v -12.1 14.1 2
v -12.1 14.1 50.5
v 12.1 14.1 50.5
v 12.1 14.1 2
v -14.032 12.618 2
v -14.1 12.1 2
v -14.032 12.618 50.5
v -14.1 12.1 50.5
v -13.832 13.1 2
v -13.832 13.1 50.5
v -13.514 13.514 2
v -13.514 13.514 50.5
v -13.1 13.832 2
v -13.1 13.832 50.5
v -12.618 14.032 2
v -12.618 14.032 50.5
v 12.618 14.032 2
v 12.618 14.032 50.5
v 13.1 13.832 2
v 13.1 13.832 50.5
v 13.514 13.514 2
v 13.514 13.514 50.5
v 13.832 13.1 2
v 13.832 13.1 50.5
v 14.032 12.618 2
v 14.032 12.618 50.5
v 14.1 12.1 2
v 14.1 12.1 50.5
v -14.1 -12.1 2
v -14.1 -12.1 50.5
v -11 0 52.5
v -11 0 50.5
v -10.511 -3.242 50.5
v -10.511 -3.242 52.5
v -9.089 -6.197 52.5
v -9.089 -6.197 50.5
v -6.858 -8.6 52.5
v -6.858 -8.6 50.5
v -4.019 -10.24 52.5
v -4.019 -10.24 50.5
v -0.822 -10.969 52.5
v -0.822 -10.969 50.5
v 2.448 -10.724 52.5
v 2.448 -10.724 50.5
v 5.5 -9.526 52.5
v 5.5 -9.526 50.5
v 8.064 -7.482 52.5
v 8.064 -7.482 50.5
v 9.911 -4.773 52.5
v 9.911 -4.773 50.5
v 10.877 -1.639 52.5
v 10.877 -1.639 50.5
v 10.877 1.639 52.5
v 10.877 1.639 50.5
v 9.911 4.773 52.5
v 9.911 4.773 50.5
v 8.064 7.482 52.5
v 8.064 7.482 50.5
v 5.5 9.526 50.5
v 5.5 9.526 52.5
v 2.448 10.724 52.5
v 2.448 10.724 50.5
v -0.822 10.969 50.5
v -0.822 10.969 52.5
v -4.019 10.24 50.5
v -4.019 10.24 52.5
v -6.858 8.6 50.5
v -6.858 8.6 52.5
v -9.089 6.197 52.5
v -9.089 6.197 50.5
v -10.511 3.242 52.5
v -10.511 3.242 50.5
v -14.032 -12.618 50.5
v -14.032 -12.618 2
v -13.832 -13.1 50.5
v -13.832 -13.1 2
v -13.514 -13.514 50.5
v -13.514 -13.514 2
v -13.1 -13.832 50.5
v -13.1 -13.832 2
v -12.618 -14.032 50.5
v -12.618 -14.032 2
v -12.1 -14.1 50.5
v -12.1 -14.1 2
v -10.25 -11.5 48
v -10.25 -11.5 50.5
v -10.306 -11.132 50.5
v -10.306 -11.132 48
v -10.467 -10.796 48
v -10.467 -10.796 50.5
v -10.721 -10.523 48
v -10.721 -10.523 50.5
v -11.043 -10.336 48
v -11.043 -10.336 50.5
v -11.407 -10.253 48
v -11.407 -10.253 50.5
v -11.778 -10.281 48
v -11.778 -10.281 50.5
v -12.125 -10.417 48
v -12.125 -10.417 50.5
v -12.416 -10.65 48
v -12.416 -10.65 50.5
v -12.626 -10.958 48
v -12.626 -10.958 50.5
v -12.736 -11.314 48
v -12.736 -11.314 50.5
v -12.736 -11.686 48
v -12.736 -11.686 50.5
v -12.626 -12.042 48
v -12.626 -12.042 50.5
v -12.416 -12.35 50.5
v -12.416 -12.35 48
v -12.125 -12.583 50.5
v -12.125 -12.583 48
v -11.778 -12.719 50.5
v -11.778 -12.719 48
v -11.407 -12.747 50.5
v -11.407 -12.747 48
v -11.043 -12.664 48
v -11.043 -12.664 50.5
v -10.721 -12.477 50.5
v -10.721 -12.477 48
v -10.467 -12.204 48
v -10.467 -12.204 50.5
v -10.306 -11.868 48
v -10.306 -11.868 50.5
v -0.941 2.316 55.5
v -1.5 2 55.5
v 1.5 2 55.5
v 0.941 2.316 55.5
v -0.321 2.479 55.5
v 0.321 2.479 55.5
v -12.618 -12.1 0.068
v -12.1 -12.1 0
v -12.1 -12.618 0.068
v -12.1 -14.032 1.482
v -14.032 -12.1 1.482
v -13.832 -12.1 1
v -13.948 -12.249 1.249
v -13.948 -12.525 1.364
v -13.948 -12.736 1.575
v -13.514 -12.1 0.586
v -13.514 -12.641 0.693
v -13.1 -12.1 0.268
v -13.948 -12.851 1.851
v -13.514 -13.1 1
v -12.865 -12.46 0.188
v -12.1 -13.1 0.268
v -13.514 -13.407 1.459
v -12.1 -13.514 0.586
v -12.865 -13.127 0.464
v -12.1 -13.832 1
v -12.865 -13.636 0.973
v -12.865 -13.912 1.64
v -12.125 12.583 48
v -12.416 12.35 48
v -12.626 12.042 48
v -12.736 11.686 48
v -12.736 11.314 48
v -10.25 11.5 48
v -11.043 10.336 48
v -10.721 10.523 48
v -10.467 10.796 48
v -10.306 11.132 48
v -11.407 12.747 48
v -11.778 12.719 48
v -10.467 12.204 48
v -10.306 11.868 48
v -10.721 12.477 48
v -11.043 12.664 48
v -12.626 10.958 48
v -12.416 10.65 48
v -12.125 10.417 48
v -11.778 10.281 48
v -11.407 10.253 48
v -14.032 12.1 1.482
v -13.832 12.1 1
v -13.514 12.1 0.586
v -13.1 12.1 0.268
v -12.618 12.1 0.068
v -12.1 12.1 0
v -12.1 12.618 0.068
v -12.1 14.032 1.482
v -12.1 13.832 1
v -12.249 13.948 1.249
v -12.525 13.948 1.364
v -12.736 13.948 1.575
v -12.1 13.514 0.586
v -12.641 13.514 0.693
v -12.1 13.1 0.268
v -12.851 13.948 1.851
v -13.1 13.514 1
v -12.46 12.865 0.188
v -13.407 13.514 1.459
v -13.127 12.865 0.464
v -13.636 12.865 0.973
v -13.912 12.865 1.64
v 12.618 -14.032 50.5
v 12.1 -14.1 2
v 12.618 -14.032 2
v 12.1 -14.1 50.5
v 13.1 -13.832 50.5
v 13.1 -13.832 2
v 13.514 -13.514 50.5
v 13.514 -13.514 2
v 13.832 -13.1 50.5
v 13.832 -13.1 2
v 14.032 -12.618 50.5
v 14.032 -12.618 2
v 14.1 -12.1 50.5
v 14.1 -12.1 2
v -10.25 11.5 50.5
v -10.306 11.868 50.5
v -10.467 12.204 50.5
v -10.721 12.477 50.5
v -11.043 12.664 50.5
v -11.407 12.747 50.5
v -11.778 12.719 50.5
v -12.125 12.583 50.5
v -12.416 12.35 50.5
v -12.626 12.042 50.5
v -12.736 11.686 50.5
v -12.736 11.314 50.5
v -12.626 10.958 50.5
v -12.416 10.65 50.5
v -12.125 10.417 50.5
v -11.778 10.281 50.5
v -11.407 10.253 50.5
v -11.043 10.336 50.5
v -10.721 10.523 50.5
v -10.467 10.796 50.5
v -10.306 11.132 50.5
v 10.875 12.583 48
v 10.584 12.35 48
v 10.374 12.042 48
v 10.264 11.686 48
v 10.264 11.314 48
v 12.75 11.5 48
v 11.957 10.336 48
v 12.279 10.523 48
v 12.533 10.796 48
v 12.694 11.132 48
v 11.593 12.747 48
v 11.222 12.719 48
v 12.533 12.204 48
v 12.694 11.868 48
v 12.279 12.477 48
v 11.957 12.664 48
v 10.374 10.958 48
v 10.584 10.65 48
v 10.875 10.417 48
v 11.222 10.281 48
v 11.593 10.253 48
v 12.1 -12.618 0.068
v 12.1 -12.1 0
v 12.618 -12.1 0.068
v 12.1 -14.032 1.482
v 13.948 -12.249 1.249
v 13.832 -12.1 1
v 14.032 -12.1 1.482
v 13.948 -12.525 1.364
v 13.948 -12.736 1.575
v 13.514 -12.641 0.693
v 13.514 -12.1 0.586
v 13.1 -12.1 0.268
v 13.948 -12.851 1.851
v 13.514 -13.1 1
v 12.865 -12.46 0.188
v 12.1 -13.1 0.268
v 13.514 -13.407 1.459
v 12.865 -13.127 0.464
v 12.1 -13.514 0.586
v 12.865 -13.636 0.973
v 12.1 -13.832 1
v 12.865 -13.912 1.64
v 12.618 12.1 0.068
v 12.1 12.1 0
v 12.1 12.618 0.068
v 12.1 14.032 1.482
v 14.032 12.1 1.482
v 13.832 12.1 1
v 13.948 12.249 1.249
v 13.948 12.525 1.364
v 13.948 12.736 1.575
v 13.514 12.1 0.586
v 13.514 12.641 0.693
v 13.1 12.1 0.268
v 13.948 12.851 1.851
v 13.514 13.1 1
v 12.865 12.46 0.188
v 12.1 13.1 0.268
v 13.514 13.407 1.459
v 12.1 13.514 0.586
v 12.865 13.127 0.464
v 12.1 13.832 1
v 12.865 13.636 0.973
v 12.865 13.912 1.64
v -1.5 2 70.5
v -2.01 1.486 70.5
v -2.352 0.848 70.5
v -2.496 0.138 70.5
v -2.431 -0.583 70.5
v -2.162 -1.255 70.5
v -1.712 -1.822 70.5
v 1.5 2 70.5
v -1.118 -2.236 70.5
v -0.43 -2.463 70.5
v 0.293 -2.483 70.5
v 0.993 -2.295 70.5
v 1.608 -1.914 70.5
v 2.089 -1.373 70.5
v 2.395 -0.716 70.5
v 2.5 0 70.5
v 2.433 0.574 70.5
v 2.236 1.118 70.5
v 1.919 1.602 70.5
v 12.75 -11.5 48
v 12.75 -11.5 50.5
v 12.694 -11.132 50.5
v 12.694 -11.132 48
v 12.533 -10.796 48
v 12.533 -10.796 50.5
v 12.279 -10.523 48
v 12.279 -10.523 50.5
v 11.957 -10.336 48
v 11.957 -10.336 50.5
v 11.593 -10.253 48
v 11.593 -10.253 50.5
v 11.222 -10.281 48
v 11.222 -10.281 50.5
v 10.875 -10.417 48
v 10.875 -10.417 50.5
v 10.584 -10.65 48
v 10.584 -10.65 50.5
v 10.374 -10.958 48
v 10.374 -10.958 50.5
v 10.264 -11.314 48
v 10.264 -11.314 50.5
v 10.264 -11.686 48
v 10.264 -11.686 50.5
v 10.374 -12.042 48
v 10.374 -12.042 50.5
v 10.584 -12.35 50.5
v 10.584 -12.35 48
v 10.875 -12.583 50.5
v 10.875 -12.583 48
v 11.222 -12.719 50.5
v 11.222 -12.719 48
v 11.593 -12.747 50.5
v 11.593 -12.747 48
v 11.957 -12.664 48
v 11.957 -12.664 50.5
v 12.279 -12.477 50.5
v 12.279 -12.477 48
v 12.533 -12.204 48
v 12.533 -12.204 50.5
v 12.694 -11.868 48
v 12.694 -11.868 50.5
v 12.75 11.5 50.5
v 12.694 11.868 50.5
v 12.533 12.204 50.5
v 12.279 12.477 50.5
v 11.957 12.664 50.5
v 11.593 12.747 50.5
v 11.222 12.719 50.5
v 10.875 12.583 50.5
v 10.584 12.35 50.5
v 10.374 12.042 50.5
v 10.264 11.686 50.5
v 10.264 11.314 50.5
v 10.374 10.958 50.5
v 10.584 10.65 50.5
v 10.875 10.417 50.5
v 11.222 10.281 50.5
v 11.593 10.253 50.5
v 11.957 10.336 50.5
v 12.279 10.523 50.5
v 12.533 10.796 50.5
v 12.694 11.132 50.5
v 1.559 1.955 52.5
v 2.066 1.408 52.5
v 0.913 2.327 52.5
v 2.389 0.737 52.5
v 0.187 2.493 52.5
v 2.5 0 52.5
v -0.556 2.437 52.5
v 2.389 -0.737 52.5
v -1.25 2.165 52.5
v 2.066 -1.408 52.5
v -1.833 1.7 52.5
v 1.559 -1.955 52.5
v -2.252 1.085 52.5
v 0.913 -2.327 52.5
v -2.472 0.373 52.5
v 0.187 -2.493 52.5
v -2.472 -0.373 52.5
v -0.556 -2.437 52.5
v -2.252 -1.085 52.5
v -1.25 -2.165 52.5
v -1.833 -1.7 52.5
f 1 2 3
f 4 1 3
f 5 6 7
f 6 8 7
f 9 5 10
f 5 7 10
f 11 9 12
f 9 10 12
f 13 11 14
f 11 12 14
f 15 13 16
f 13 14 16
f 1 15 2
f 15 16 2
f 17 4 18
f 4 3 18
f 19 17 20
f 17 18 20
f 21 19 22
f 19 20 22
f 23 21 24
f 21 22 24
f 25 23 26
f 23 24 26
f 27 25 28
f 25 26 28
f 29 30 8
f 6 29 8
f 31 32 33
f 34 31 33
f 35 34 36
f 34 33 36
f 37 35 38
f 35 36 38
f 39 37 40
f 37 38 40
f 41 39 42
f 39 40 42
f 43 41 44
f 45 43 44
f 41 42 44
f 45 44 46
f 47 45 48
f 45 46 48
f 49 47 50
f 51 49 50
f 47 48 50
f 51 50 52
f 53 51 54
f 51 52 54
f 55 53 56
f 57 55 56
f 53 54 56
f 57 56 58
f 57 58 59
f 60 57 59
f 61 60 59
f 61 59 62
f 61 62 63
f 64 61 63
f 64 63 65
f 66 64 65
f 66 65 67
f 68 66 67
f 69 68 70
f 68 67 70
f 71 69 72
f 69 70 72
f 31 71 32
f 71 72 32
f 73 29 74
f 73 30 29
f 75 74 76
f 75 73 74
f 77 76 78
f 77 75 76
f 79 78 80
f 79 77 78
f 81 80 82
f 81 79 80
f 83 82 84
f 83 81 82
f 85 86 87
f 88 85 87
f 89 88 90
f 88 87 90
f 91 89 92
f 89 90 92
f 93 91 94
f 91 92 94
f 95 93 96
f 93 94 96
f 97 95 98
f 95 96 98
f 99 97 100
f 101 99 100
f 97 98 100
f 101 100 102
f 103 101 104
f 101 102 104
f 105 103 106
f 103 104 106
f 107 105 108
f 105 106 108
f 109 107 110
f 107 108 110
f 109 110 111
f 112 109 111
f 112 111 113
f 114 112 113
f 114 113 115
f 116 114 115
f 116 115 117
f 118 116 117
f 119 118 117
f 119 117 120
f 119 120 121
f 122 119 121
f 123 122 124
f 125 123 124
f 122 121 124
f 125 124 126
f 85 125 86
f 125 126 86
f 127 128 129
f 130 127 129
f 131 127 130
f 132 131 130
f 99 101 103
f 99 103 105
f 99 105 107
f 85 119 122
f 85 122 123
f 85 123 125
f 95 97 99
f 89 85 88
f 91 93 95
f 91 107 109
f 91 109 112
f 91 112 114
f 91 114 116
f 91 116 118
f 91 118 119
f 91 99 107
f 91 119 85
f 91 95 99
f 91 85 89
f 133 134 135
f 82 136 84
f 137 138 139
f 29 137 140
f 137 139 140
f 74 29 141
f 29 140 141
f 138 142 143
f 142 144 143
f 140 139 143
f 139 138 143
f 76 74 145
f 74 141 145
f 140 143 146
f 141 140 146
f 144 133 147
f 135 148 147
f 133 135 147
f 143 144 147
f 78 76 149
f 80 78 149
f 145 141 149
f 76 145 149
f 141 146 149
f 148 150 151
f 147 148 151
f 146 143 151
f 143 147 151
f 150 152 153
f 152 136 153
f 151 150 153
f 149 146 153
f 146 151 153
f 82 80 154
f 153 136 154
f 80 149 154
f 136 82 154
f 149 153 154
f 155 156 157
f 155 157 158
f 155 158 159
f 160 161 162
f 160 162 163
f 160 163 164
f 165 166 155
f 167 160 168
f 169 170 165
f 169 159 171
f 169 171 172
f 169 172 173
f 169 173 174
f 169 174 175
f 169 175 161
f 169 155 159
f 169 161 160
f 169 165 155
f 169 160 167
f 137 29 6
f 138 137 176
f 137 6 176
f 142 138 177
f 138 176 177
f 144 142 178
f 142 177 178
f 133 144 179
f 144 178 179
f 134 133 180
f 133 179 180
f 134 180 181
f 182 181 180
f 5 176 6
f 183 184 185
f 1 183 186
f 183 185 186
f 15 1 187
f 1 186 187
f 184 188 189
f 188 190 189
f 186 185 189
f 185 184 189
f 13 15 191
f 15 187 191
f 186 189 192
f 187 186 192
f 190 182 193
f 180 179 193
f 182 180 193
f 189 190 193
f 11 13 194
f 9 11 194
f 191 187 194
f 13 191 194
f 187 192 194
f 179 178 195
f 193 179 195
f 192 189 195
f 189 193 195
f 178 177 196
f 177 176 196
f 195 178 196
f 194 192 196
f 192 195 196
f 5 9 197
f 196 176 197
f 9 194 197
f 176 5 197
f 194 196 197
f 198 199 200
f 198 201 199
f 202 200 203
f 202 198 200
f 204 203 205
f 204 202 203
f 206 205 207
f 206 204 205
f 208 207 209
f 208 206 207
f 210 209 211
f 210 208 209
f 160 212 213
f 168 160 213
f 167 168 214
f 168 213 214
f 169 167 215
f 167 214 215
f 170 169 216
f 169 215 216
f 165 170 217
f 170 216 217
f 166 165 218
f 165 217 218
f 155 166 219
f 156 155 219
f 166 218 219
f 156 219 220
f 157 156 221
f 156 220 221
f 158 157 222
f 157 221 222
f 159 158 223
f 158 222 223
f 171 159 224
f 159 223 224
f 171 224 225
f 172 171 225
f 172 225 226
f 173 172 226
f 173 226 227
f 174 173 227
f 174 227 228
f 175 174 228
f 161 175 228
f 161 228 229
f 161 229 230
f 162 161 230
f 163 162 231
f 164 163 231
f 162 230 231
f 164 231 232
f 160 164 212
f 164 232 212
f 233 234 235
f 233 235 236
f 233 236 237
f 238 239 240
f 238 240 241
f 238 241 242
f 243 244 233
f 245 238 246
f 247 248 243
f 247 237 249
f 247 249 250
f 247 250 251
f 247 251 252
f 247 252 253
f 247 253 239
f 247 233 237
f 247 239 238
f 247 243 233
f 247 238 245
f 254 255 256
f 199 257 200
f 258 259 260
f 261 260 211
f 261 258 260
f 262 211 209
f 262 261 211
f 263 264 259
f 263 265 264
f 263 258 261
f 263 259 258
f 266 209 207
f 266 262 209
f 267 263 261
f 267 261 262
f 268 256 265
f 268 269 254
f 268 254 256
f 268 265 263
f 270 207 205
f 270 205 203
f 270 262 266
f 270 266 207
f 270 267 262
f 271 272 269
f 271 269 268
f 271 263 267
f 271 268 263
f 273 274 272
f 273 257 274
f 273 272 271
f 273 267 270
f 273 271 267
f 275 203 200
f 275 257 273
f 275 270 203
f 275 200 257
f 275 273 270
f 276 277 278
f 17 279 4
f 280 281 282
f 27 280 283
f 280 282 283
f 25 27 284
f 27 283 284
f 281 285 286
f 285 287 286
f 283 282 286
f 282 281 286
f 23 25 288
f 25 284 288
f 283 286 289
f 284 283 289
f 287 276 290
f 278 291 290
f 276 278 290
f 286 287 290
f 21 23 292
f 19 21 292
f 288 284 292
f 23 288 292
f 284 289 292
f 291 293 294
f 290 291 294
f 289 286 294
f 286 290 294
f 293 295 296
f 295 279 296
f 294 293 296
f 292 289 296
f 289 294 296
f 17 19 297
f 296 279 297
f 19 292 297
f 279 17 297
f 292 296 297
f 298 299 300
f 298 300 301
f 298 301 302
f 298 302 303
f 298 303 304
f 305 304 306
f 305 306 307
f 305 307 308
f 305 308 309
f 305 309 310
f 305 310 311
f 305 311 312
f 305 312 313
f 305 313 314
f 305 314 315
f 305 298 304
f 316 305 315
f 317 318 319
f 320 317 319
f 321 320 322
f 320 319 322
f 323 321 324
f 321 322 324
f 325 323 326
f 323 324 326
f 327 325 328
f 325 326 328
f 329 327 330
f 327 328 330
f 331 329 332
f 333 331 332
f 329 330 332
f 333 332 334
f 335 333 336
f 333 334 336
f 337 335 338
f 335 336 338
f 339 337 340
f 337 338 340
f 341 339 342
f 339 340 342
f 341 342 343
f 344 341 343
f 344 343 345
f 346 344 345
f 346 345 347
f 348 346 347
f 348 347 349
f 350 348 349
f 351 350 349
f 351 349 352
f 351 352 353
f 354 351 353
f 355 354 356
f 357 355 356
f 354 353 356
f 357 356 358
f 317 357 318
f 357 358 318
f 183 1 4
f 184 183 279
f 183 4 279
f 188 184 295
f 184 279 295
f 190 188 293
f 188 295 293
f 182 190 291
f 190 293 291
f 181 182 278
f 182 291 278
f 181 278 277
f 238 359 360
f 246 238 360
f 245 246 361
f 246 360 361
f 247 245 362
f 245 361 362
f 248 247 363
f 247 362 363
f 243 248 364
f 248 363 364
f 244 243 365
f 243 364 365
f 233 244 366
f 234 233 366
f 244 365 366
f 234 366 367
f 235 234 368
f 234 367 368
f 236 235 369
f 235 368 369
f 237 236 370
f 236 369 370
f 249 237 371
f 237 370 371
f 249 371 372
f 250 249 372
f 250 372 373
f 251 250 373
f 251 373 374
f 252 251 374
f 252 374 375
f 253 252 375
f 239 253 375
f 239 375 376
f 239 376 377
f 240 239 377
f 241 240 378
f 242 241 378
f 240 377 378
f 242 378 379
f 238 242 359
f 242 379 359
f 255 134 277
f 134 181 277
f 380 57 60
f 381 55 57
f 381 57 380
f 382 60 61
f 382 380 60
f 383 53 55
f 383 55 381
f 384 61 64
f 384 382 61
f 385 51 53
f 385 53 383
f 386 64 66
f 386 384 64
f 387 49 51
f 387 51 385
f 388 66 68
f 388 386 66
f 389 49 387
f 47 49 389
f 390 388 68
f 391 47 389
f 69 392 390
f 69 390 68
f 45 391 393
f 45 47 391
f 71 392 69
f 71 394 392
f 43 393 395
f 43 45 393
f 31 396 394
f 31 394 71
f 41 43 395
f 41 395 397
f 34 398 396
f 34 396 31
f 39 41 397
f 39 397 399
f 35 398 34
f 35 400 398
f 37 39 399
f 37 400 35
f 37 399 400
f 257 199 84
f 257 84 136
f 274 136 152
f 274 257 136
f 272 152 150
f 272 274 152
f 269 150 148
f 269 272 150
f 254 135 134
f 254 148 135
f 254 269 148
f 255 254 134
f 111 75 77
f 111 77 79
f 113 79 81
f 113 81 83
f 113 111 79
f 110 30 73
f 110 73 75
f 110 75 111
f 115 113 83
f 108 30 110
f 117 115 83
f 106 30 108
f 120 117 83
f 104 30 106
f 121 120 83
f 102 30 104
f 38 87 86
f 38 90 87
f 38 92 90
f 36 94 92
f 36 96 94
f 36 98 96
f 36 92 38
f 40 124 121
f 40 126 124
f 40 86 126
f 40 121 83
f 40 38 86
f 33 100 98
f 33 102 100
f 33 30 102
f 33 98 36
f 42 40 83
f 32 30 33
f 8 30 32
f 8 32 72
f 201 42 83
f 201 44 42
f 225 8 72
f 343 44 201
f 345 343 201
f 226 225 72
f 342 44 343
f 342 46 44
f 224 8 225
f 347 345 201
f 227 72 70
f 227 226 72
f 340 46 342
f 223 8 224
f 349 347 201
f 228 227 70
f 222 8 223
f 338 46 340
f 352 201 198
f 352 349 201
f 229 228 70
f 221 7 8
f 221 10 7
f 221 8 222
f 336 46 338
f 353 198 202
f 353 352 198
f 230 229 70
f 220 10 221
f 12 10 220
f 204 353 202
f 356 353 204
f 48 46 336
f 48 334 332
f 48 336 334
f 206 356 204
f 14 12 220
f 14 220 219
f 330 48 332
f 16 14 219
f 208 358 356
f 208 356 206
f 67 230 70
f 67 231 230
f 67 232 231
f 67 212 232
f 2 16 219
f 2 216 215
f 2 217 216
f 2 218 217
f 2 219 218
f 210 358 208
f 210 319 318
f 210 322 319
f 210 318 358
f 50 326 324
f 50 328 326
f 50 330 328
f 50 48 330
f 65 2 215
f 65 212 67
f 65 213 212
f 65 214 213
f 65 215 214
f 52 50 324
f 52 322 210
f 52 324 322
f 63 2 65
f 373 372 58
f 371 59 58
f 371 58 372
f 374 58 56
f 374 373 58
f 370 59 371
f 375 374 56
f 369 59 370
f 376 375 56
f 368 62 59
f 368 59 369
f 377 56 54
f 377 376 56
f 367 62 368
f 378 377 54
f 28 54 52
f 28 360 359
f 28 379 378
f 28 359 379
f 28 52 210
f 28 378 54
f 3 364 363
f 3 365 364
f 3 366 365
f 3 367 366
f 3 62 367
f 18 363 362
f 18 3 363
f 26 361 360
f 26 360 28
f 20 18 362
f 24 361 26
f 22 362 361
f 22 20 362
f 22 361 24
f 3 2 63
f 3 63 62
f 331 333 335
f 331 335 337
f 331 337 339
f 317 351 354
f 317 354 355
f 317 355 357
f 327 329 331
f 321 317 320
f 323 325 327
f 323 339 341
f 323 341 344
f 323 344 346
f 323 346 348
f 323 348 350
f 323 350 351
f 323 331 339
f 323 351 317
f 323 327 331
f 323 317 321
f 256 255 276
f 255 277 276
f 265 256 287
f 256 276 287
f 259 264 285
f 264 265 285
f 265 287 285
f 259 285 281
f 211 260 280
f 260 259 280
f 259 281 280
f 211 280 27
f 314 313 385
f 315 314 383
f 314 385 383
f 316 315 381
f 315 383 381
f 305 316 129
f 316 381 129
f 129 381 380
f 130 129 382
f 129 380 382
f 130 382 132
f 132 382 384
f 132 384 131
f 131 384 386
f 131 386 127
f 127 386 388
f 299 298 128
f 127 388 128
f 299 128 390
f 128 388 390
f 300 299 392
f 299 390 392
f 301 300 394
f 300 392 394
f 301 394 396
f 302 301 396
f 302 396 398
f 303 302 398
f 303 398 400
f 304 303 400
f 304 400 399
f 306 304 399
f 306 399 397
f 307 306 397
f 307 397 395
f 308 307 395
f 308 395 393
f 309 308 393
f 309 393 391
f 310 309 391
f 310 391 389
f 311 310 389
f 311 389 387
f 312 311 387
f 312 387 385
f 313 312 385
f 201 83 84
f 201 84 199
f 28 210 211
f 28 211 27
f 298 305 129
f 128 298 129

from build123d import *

# Parameters (mm, degrees)
SKETCH1_W           = 28.2
SKETCH1_H           = 28.2
BOSS_EXTRUDE1_DEPTH = 50.5
SKETCH2_R           = 11
BOSS_EXTRUDE2_DEPTH = 2
SKETCH3_R           = 2.5
BOSS_EXTRUDE3_DEPTH = 18
SKETCH4_W           = 15
SKETCH4_H           = 0.5
CUT_EXTRUDE1_DEPTH  = 5
SKETCH5_R           = 1.25
CUT_EXTRUDE2_DEPTH  = 2.5
FILLET1_R           = 2


with BuildPart() as part:
    # Sketch1 → Boss-Extrude1 (new body)
    with BuildSketch(Plane.XY):
        Rectangle(SKETCH1_W, SKETCH1_H)
    extrude(amount=BOSS_EXTRUDE1_DEPTH)

    # Sketch2 → Boss-Extrude2 (add)
    with BuildSketch(Plane.XY.offset(50.5)):
        with Locations(Location((0, 0, 0), (0, 0, 180))):
            Circle(SKETCH2_R)
    extrude(amount=BOSS_EXTRUDE2_DEPTH)

    # Sketch3 → Boss-Extrude3 (add)
    with BuildSketch(Plane.XY.offset(52.5)):
        Circle(SKETCH3_R)
    extrude(amount=BOSS_EXTRUDE3_DEPTH)

    # Sketch4 → Cut-Extrude1 (cut, symmetric)
    with BuildSketch(Plane(origin=(0, 0, 0), x_dir=(0, 0, -1), z_dir=(1, 0, 0))):
        with Locations((-63, 2.25)):
            Rectangle(SKETCH4_W, SKETCH4_H)
    extrude(amount=CUT_EXTRUDE1_DEPTH, both=True, mode=Mode.SUBTRACT)

    # Sketch5 → Cut-Extrude2 (cut)
    with BuildSketch(Plane.XY.offset(50.5)):
        with Locations((-11.5, 11.5)):
            Circle(SKETCH5_R)
        with Locations((11.5, 11.5)):
            Circle(SKETCH5_R)
        with Locations((11.5, -11.5)):
            Circle(SKETCH5_R)
        with Locations((-11.5, -11.5)):
            Circle(SKETCH5_R)
    extrude(amount=-CUT_EXTRUDE2_DEPTH, mode=Mode.SUBTRACT)

    # Fillet1
    fillet1_edges = [part.edges().sort_by_distance(p)[0] for p in [
        (0, -14.1, 0),
        (-14.1, 0, 0),
        (0, 14.1, 0),
        (14.1, 0, 0),
        (14.1, -14.1, 25.25),
        (-14.1, -14.1, 25.25),
        (-14.1, 14.1, 25.25),
        (14.1, 14.1, 25.25),
    ]]
    fillet(fillet1_edges, radius=FILLET1_R)


solid = part.part
